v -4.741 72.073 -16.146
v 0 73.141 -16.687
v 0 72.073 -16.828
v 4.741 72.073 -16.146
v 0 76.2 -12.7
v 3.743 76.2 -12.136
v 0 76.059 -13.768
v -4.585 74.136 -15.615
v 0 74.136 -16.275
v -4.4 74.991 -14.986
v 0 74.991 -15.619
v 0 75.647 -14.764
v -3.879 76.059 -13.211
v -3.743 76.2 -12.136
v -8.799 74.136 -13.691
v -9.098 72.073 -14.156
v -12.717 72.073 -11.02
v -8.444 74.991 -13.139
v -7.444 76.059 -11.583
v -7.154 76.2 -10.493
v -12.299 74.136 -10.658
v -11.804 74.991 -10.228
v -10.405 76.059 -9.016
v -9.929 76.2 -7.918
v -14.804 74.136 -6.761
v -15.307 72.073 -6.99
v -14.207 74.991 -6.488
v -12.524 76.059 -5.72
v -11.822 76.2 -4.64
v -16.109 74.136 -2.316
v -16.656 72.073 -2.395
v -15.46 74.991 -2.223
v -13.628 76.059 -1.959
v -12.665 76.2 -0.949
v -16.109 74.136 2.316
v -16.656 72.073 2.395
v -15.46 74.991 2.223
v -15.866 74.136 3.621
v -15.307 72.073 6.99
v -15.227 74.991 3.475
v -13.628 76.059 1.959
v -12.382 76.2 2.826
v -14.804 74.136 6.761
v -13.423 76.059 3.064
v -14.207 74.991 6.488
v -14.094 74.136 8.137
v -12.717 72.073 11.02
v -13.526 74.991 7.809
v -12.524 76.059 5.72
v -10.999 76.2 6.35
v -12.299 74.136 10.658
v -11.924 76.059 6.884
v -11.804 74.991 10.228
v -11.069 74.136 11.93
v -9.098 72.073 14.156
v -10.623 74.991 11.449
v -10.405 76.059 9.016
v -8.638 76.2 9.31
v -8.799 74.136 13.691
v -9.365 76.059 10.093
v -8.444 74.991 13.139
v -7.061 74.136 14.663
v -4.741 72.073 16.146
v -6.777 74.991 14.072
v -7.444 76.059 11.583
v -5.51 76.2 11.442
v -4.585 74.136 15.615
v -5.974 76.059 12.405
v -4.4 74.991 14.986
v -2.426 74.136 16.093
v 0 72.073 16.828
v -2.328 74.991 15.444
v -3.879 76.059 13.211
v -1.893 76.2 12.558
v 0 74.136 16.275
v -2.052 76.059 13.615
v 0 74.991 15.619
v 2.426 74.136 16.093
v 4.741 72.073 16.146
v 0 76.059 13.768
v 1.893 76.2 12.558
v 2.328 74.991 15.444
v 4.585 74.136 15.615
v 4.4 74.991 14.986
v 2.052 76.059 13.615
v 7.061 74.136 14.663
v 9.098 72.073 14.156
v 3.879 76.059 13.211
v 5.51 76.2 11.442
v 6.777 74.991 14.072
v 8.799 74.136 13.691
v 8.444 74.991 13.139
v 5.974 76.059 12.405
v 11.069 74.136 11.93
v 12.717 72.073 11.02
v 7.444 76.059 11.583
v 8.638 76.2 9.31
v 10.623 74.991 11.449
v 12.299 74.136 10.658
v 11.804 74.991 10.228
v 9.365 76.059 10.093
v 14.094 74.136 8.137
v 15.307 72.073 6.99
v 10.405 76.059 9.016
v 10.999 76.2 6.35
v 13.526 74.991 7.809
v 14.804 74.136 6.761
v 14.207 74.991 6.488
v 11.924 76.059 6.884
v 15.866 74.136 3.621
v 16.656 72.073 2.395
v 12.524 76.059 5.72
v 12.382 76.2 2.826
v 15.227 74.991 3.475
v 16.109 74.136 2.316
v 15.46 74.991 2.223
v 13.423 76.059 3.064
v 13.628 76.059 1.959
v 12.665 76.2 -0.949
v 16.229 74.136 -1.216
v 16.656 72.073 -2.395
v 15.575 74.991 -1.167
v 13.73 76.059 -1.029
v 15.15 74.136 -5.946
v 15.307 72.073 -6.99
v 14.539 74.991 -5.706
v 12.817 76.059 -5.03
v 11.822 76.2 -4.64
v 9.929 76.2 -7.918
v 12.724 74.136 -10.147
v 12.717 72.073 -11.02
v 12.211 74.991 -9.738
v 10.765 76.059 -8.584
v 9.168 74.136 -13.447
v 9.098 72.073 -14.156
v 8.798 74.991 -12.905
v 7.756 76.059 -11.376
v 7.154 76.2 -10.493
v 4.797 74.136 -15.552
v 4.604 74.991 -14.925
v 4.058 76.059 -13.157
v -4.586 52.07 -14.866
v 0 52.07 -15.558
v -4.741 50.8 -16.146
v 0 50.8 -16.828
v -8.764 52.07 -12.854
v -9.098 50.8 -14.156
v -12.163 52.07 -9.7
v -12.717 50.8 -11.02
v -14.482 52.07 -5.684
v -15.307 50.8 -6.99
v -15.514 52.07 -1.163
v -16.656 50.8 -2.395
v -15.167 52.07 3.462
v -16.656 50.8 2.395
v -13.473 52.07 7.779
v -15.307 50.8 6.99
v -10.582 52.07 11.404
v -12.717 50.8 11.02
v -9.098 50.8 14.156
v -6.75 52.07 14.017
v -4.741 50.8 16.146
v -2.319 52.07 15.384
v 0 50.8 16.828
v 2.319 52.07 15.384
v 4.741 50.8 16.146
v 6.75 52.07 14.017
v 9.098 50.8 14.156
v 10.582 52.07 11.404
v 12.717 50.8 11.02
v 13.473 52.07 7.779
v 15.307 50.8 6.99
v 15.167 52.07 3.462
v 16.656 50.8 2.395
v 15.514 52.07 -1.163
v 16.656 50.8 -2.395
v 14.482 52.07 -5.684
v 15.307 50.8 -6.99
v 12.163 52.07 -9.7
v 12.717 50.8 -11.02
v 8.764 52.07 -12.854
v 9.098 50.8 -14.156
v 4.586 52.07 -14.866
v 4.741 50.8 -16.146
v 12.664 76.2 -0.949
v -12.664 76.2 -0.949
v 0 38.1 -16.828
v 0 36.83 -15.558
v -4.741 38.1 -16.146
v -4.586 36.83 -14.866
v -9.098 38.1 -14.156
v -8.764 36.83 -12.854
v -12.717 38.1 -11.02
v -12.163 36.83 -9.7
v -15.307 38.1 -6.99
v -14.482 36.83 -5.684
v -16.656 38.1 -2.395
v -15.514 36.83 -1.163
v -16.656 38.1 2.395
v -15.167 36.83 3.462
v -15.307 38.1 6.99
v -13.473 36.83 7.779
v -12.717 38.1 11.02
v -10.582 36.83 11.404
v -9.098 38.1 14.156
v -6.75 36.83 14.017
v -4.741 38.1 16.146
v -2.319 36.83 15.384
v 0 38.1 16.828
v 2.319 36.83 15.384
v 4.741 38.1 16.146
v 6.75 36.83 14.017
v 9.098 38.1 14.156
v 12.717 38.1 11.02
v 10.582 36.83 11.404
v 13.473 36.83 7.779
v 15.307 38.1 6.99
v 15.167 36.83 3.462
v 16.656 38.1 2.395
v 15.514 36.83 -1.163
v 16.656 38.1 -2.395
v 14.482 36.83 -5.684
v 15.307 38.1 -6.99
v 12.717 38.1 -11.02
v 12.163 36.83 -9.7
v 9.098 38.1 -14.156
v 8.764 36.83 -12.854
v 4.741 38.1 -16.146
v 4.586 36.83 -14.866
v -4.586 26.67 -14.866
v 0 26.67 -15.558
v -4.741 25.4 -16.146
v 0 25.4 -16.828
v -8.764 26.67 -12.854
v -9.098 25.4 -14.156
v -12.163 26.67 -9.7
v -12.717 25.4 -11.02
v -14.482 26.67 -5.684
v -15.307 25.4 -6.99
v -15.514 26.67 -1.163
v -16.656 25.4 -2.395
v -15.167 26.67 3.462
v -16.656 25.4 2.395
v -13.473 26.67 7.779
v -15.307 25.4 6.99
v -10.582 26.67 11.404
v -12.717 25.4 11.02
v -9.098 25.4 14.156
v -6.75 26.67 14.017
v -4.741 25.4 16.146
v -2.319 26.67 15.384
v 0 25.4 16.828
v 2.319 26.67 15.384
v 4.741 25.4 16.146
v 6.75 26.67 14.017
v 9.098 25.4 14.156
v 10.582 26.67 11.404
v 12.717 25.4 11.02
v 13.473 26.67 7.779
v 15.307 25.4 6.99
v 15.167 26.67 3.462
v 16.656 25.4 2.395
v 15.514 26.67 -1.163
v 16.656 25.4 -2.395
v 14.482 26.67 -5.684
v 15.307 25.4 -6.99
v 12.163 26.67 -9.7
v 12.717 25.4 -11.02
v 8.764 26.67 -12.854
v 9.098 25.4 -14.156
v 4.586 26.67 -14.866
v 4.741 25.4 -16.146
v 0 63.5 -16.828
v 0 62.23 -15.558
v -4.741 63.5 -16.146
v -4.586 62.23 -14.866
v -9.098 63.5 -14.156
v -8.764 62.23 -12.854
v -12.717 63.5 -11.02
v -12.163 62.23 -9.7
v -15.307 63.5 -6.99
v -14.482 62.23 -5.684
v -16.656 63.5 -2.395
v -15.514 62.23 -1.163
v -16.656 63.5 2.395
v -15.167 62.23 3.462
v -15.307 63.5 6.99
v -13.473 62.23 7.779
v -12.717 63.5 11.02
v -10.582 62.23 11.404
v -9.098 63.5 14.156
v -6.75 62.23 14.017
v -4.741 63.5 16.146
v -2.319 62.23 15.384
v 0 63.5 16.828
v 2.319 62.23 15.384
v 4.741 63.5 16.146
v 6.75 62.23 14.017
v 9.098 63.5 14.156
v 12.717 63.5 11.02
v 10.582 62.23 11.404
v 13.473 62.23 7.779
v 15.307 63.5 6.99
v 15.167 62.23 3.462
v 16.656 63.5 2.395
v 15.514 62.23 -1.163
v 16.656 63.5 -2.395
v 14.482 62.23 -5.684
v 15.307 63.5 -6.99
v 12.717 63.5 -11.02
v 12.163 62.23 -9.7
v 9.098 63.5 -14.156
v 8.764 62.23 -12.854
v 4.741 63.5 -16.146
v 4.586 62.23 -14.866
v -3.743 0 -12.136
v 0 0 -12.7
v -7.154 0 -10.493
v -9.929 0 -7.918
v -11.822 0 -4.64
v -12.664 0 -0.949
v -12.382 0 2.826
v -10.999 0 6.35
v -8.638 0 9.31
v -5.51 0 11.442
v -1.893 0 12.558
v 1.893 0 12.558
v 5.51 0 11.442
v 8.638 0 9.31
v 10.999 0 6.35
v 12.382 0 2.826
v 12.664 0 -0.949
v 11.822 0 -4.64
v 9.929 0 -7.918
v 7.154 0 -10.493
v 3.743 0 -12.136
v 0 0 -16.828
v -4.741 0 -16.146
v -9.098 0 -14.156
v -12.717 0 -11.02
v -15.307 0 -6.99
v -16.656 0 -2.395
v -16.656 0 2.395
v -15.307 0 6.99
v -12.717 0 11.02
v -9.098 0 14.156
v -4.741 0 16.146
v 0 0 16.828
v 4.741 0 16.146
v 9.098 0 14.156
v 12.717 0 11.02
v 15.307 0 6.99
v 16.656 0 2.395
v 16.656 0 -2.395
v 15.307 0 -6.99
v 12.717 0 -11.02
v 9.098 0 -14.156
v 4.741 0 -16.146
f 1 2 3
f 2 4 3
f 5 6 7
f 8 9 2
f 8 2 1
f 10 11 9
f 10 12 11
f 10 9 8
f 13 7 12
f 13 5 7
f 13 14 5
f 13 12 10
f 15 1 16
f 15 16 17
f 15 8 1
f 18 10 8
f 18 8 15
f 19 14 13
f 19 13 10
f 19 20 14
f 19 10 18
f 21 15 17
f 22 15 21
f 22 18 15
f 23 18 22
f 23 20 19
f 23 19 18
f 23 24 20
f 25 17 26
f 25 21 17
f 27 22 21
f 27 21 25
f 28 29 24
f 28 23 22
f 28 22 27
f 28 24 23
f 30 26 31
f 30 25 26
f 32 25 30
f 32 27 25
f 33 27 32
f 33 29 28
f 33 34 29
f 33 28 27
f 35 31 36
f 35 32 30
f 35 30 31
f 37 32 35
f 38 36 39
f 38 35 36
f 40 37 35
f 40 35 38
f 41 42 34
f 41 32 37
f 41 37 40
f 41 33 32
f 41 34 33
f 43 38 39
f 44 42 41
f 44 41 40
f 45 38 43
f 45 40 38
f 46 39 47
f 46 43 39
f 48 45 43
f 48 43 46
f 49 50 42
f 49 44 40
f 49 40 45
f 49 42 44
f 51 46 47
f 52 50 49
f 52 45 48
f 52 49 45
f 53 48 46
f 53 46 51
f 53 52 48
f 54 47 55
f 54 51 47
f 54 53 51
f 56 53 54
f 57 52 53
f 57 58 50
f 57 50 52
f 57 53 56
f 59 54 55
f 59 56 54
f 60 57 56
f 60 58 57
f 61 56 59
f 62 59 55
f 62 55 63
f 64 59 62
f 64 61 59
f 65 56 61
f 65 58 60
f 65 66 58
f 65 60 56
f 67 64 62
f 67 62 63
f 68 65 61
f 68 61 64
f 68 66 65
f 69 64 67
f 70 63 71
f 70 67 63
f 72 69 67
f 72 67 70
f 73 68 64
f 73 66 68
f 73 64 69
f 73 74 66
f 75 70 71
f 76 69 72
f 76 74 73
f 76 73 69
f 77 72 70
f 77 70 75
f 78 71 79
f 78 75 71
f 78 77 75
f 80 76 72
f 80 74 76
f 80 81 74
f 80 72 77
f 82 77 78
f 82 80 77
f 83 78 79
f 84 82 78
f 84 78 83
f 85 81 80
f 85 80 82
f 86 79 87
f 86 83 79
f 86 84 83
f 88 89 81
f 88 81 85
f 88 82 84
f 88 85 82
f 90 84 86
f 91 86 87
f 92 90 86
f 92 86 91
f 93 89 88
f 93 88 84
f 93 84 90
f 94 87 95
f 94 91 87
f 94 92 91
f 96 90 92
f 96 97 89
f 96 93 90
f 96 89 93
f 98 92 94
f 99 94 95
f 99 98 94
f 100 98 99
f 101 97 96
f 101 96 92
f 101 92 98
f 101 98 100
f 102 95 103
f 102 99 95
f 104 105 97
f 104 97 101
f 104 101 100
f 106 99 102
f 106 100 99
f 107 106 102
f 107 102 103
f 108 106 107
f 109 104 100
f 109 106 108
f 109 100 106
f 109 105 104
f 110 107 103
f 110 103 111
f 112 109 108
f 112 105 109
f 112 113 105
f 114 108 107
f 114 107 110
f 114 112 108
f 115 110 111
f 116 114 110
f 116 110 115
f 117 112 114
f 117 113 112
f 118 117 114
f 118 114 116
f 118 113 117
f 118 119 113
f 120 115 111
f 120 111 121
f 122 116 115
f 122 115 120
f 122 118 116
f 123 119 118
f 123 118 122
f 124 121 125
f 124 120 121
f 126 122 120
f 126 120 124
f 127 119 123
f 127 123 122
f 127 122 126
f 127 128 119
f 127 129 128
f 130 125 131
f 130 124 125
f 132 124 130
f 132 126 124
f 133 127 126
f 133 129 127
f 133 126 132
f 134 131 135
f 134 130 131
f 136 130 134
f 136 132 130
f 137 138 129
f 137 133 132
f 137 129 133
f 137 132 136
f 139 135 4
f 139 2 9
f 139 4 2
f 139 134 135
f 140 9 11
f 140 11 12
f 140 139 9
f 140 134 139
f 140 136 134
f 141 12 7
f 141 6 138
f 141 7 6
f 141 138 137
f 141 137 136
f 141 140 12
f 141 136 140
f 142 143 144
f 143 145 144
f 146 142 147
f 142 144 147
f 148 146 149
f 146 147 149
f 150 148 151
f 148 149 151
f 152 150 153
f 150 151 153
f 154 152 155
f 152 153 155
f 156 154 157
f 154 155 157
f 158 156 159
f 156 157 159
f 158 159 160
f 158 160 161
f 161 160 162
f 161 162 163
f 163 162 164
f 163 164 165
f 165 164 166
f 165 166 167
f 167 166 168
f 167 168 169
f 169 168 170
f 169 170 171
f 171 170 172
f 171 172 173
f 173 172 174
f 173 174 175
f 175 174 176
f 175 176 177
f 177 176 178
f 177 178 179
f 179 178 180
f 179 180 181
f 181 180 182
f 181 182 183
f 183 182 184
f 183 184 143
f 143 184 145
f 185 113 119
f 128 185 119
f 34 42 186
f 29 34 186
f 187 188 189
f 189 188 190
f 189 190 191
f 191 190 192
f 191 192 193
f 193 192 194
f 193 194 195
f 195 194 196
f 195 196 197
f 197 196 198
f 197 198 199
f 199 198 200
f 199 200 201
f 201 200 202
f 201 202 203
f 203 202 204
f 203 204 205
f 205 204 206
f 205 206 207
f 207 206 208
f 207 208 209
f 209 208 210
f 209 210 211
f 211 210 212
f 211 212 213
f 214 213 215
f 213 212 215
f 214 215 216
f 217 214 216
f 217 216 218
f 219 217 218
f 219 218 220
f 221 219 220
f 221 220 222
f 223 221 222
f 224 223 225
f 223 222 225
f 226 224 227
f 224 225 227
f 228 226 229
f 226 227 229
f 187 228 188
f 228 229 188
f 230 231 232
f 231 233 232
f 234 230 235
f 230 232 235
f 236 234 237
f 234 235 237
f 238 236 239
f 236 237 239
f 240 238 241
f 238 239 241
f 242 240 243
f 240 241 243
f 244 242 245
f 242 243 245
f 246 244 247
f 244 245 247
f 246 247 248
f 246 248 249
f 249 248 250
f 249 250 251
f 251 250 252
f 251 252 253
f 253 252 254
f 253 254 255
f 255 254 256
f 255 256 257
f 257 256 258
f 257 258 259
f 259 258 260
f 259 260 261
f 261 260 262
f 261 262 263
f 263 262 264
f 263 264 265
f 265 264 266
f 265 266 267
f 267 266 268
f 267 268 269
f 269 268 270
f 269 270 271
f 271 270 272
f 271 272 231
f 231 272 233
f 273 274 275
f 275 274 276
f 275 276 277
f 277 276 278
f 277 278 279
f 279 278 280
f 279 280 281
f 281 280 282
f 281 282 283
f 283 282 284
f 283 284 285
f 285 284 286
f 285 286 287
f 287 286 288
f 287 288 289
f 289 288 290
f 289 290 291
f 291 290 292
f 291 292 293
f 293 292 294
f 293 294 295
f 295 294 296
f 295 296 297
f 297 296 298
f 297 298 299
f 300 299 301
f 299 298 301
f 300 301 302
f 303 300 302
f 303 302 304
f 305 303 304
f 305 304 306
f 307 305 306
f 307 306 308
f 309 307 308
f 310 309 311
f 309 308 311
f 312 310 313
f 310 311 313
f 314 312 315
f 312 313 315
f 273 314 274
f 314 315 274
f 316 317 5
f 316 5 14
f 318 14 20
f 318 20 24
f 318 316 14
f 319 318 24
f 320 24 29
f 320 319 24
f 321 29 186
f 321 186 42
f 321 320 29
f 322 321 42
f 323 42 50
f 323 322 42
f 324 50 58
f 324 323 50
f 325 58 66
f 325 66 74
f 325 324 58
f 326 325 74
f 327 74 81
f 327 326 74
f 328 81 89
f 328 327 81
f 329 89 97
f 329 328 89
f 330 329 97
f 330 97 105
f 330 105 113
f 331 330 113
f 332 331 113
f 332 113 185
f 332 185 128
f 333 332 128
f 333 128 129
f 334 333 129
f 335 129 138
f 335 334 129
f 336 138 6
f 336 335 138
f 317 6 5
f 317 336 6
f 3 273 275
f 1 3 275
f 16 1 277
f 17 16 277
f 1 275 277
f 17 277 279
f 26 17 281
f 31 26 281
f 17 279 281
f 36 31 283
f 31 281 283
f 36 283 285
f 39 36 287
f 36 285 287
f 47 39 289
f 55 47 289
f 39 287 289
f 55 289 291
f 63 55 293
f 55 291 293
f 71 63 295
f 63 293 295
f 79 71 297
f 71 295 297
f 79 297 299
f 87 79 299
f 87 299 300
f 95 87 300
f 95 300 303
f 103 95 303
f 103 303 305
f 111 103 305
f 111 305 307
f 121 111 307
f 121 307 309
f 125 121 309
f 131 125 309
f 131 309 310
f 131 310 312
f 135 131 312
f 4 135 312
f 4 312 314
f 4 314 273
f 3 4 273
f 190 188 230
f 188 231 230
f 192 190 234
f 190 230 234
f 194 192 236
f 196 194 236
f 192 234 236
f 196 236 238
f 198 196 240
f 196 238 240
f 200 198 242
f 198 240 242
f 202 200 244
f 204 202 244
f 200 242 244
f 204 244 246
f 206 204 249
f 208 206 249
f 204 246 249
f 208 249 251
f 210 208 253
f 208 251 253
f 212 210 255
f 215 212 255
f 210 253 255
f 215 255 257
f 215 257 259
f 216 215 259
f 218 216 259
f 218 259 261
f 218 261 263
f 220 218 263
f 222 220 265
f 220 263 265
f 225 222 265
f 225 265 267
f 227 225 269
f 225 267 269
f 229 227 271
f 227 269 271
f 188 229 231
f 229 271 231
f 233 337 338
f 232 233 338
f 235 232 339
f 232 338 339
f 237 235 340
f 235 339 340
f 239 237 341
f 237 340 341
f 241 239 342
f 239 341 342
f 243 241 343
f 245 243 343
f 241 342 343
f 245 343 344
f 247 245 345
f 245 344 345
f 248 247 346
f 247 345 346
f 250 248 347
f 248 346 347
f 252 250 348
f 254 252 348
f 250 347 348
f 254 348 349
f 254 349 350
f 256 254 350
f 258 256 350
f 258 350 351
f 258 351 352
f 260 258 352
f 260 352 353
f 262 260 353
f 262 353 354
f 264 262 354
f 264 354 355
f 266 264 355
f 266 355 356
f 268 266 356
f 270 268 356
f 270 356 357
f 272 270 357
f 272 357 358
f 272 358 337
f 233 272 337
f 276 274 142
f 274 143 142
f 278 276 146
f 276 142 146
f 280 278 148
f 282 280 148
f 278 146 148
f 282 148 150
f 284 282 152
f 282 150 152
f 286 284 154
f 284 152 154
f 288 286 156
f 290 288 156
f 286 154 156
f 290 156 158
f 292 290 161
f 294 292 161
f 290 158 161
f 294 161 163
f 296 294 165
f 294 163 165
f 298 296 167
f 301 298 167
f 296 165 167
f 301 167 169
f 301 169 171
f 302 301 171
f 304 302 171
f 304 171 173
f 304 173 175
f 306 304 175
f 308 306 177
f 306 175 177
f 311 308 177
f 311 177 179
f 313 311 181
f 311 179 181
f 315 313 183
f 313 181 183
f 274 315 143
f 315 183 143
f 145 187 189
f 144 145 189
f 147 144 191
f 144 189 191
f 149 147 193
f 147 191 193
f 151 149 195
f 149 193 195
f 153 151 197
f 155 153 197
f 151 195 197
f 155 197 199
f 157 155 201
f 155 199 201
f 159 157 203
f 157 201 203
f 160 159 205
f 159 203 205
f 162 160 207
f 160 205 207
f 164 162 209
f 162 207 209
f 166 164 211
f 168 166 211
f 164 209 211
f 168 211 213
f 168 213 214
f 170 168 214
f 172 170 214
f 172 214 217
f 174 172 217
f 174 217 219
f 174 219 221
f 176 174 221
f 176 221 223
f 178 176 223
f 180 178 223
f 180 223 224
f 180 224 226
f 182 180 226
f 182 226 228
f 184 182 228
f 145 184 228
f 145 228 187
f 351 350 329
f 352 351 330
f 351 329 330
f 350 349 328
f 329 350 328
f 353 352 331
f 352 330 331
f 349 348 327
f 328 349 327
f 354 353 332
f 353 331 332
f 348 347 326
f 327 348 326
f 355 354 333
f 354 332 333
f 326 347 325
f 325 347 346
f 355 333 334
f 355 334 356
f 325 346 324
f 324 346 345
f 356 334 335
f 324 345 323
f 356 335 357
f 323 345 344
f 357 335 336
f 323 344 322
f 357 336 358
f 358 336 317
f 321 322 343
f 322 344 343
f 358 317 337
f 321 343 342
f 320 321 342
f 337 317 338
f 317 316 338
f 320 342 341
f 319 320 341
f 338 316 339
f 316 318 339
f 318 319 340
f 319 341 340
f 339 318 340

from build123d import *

# Parameters (mm, degrees)
SKETCH1_R           = 16.8275
SKETCH1_R_2         = 12.7
BOSS_EXTRUDE1_DEPTH = 76.2
FILLET1_R           = 4.1275


with BuildPart() as part:
    # Sketch1 → Boss-Extrude1 (new body)
    with BuildSketch(Plane(origin=(0, 0, 0), x_dir=(1, 0, 0), z_dir=(0, 1, 0))):
        with Locations(Location((0, 0, 0), (0, 0, 90))):
            Circle(SKETCH1_R)
        with Locations(Location((0, 0, 0), (0, 0, 90))):
            Circle(SKETCH1_R_2, mode=Mode.SUBTRACT)
    extrude(amount=BOSS_EXTRUDE1_DEPTH)

    # Fillet1
    fillet1_edges = [part.edges().sort_by_distance(p)[0] for p in [
        (0, 76.2, 16.8275),
    ]]
    fillet(fillet1_edges, radius=FILLET1_R - 0.0001)  # a hair under: the kernel refuses the full size

    # Sketch2 → Cut-Revolve1 (revolve, cut)
    with BuildSketch(Plane.XY, mode=Mode.PRIVATE) as cut_revolve1_sk:
        Polygon((16.8275, 63.5), (15.5575, 62.23), (15.5575, 52.07), (16.8275, 50.8), align=None)
        Polygon((16.8275, 38.1), (15.5575, 36.83), (15.5575, 26.67), (16.8275, 25.4), align=None)
    revolve(cut_revolve1_sk.sketch.rotate(Axis((0, 0, 0), (0, 1, 0)), 90), axis=Axis((0, 0, 0), (0, 1, 0)), mode=Mode.SUBTRACT)


solid = part.part
